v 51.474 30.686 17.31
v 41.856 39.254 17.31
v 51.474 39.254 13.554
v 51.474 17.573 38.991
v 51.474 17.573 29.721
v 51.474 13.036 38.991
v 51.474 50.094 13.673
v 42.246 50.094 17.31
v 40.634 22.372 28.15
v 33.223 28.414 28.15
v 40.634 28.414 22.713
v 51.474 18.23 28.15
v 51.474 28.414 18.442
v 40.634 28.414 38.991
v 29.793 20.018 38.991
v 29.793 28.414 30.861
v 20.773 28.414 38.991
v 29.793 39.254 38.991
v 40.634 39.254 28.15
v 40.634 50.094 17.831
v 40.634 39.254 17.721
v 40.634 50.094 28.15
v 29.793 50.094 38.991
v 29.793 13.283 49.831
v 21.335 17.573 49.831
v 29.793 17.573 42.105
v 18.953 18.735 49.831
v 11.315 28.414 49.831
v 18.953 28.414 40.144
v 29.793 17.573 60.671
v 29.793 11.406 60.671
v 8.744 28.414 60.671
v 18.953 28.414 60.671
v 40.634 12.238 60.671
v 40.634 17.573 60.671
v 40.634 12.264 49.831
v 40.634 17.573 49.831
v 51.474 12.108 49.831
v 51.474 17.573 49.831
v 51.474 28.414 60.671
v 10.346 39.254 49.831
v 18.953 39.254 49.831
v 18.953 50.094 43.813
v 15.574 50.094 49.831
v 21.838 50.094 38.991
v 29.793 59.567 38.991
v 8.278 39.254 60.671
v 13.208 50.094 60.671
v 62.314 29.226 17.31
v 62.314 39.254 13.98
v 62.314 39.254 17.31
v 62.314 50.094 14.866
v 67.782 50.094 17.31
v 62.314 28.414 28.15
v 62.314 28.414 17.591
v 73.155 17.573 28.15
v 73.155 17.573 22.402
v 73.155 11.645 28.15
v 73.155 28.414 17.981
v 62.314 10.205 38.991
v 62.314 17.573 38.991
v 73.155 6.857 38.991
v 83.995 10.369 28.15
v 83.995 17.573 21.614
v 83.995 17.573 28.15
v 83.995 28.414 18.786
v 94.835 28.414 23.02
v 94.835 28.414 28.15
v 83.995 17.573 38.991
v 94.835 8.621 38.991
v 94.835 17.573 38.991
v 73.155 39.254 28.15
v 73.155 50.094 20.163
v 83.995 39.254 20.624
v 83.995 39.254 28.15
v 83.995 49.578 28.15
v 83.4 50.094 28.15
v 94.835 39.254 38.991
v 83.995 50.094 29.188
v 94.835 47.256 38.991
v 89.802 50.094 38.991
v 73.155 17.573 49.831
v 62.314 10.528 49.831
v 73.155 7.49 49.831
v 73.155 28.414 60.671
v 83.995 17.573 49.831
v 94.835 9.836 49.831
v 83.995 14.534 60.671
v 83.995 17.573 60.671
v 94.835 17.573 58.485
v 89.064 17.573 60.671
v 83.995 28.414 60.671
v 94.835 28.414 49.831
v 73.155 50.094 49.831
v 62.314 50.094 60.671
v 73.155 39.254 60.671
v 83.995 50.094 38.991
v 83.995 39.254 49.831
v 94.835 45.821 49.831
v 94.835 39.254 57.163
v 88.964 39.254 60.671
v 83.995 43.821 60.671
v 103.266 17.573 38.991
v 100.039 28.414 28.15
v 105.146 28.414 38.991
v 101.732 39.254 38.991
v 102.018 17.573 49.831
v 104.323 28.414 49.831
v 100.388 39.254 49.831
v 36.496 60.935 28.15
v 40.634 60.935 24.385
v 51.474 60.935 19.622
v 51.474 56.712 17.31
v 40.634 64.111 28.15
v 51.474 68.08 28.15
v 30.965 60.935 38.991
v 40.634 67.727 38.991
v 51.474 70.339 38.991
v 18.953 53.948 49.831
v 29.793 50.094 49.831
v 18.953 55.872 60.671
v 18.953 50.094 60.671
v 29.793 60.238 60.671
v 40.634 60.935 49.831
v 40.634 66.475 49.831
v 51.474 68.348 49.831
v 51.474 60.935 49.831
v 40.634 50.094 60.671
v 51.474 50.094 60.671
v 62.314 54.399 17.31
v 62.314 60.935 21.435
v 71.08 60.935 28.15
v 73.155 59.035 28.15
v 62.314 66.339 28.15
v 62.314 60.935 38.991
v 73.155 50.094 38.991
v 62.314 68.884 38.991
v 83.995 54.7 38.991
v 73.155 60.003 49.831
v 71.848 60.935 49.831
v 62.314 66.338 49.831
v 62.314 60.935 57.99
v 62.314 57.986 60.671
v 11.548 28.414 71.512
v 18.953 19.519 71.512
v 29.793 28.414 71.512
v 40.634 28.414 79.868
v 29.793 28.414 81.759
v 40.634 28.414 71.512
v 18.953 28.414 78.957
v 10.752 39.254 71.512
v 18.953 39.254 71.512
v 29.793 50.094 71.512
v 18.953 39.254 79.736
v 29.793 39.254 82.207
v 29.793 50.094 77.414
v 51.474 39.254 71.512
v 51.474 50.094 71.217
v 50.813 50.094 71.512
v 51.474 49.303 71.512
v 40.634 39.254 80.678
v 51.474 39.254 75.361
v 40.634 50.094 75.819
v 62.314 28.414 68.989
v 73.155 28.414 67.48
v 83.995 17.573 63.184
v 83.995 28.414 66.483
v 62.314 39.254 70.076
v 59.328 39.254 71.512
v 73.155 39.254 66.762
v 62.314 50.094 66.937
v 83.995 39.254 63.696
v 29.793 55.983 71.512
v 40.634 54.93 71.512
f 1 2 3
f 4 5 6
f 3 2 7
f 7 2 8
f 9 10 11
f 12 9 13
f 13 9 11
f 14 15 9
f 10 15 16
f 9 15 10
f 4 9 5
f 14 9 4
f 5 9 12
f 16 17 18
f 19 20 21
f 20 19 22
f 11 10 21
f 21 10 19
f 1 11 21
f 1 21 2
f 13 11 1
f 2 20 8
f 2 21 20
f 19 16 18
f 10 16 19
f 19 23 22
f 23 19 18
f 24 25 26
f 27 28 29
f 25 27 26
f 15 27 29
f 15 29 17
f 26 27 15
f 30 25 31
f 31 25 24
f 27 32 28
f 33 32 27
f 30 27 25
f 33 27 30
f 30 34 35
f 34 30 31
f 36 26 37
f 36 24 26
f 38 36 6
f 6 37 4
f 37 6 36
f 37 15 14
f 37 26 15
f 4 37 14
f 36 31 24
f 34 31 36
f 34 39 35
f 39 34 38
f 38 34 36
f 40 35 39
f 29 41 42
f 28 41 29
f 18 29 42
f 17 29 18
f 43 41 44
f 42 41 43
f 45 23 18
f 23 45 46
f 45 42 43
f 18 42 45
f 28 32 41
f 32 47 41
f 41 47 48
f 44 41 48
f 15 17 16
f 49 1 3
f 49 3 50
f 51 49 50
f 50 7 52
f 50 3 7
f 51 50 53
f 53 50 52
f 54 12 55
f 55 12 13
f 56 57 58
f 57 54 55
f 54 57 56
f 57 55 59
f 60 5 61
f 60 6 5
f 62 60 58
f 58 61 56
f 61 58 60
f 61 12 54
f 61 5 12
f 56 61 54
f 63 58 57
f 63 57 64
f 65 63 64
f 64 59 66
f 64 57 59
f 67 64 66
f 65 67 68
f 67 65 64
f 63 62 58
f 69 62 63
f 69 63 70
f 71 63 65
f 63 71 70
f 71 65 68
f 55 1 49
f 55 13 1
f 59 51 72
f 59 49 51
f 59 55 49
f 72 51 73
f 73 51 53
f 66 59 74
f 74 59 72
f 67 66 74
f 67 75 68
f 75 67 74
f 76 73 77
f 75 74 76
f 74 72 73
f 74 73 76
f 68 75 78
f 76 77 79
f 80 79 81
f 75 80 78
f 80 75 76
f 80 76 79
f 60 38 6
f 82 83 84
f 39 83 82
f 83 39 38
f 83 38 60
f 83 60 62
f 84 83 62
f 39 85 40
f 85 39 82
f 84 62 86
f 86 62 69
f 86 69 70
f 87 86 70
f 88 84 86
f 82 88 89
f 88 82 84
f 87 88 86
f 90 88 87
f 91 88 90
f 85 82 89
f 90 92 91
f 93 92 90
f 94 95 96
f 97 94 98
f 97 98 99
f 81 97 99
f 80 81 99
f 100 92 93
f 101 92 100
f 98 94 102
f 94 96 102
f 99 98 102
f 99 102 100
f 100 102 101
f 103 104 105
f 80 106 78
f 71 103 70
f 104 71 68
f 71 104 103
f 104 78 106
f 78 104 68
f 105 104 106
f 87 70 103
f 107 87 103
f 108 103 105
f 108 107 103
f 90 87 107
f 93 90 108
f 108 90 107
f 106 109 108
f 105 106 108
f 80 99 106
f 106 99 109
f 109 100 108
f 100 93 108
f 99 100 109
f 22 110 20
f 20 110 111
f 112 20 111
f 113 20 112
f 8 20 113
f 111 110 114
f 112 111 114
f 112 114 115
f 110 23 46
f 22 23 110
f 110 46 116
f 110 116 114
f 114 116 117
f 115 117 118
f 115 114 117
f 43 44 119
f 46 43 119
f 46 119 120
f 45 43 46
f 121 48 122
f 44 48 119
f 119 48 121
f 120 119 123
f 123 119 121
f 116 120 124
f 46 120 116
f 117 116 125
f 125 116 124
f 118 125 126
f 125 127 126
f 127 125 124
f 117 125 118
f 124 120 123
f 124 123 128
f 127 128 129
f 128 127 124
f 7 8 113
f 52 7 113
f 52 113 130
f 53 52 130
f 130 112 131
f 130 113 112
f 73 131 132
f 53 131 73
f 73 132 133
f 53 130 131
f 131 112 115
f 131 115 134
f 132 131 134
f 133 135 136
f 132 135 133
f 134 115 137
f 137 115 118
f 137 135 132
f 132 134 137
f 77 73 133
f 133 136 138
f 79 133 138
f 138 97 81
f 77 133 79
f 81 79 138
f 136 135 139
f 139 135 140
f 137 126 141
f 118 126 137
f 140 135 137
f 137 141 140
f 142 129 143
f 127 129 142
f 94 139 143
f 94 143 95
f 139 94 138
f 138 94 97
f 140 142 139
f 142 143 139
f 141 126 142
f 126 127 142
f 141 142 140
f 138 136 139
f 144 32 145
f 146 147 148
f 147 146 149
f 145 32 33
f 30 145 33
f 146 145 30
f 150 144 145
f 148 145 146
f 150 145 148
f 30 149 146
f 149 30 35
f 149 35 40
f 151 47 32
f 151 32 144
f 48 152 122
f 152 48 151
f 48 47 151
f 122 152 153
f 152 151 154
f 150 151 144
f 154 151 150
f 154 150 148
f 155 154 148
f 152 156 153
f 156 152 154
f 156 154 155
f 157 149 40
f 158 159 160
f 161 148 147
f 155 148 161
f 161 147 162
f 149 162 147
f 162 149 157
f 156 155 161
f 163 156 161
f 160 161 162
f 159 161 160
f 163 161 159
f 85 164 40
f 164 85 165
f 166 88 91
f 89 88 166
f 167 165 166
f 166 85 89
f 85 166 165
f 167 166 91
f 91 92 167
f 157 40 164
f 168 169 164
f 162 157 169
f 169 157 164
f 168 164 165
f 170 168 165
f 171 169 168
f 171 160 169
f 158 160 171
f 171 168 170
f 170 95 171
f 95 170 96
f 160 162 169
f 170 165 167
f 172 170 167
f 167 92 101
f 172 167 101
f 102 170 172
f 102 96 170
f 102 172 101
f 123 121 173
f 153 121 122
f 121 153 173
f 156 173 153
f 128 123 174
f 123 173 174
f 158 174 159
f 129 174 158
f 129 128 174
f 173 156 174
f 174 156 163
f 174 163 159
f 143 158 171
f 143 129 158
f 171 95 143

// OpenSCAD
/*
SomeBalls.scad
Public Domain Code
Based on Metaballs By: William A Adams 	4 June 2011

This code is a simplified implementation of the 'metaball' and uses "Marching Cubes" to register the isosurface which is the interaction of the various balls. All Cubes are tested and a joint hull is generated of each corner that lies inside the threshold  of the metaball 



*/
Resolution = 15;//[5:5:50]
MinSubdivisions=4;//[2:1:10] 
// Smaller number larger blob
Threshold = 1.90;// [1.5:0.01:2.5]
Diagnostic=false;
Oversize=0.2;
// List Format [[x,y,z,r],[x,y,z,r]]
//MyBallList=[[50, 50, 50, -11],[25, 5, 5, 35],[95, 5, 75, 45],[-35, 5, 75, 55]];//Threshold = 1.95
MyBallList=[ for(i=[0:2])Lotto(i)];

difference(){
//DrawMetaballs(MyBallList,Threshold);
    DrawMetaballs(MyBallList,2);
//color(rndc())for(i=[0:8]){translate([rands(0, 125, 1)[0],rands(15, 30, 1)[0],rands(15, 35, 1)[0]])rotate([0,90,0])sphere(20,$fn=12);}
    }

module DrawMetaballs(BallList,Threshold) {
 ColorList = [ for(i=[0:len(BallList)])rndc() ];
 
// boundary plus some extra
size=max(findMax(BallList, 0),findMax(BallList, 1),findMax(BallList,2));
DrawSubMetaballs(BallList,ColorList,Threshold,findMin(BallList, 0)-(size*Oversize),findMin(BallList, 1)-(size*Oversize),findMin(BallList, 2)-(size*Oversize),size*(Oversize*2+1)); 
    


 }
module DrawSubMetaballs(BallList,ColorList,Threshold,x,y,z,Size,i=0) {    
  //  echo(i,Size);

suma = BallField3D(x, y, z, BallList, len(BallList) - 1);
sumb = BallField3D(x + Size, y, z, BallList, len(BallList) - 1);
sumc = BallField3D(x, y + Size, z, BallList, len(BallList) - 1);
sumd = BallField3D(x + Size, y + Size, z, BallList, len(BallList) - 1);
sume = BallField3D(x, y, z + Size, BallList, len(BallList) - 1);
sumf = BallField3D(x + Size, y, z + Size, BallList, len(BallList) - 1);
sumg = BallField3D(x, y + Size, z + Size, BallList, len(BallList) - 1);
sumh = BallField3D(x + Size, y + Size, z + Size, BallList, len(BallList) - 1);
sumcolor =lim31(1, ColorField3D(x, y, z, BallList,ColorList, len(BallList) - 1));


    
sab=inter(suma,sumb)*Size;
sac=inter(suma,sumc)*Size;
sae=inter(suma,sume)*Size;
sba=inter(sumb,suma)*Size;
sbd=inter(sumb,sumd)*Size;
sbf=inter(sumb,sumf)*Size;
sca=inter(sumc,suma)*Size;
scd=inter(sumc,sumd)*Size;
scg=inter(sumc,sumg)*Size;
sdb=inter(sumd,sumb)*Size;
sdc=inter(sumd,sumc)*Size;
sdh=inter(sumd,sumh)*Size;
sea=inter(sume,suma)*Size;
seg=inter(sume,sumg)*Size;
sef=inter(sume,sumf)*Size;
sfh=inter(sumf,sumh)*Size;
sfe=inter(sumf,sume)*Size;
sfb=inter(sumf,sumb)*Size;
sge=inter(sumg,sume)*Size;
sgh=inter(sumg,sumh)*Size;
sgc=inter(sumg,sumc)*Size;
shg=inter(sumh,sumg)*Size;
shf=inter(sumh,sumf)*Size;
shd=inter(sumh,sumd)*Size;

// test for empty and full Cubes
 if (Size>pow(Resolution, MinSubdivisions)||i<MinSubdivisions) { 
    h=Size*0.5  ;
    DrawSubMetaballs(BallList,ColorList,Threshold,x,y,z,h,i+1);
    DrawSubMetaballs(BallList,ColorList,Threshold,x+h,y,z,h,i+1);
    DrawSubMetaballs(BallList,ColorList,Threshold,x,y+h,z,h,i+1);
    DrawSubMetaballs(BallList,ColorList,Threshold,x+h,y+h,z,h,i+1);
    
    DrawSubMetaballs(BallList,ColorList,Threshold,x,y,z+h,h,i+1);
    DrawSubMetaballs(BallList,ColorList,Threshold,x+h,y,z+h,h,i+1);
    DrawSubMetaballs(BallList,ColorList,Threshold,x,y+h,z+h,h,i+1);
    DrawSubMetaballs(BallList,ColorList,Threshold,x+h,y+h,z+h,h,i+1);
    
    }else {
    
if (  suma <= Threshold && sumb <= Threshold && sumc <= Threshold && sumd <= Threshold && sume <= Threshold && sumf <= Threshold && sumg <= Threshold && sumh <= Threshold) {if (Diagnostic){translate([x, y, z]) %cube(Size);}} 
else if ( suma > Threshold && sumb > Threshold && sumc > Threshold && sumd > Threshold && sume > Threshold && sumf > Threshold && sumg > Threshold && sumh > Threshold) {
translate([x, y, z])  color(sumcolor) cube(Size);} 


else if(Size>Resolution){ 
    h=Size*0.5  ;
    DrawSubMetaballs(BallList,ColorList,Threshold,x,y,z,h,i+1);
    DrawSubMetaballs(BallList,ColorList,Threshold,x+h,y,z,h,i+1);
    DrawSubMetaballs(BallList,ColorList,Threshold,x,y+h,z,h,i+1);
    DrawSubMetaballs(BallList,ColorList,Threshold,x+h,y+h,z,h,i+1);
    
    DrawSubMetaballs(BallList,ColorList,Threshold,x,y,z+h,h,i+1);
    DrawSubMetaballs(BallList,ColorList,Threshold,x+h,y,z+h,h,i+1);
    DrawSubMetaballs(BallList,ColorList,Threshold,x,y+h,z+h,h,i+1);
    DrawSubMetaballs(BallList,ColorList,Threshold,x+h,y+h,z+h,h,i+1);}
else { 

    // For every corner inside treshold make and mirror a corner piece, hull the lot.
   //echo(sumcolor);
    color(sumcolor)hull(){
if (suma > Threshold){    translate([x, y, z])  Corner(sab,sac,sae);}
if (sumb > Threshold){    translate([x + Size, y, z])  Corner(-sba,sbd,sbf);}
if (sumc > Threshold){  translate([x, y + Size, z])  Corner(scd,-sca,scg);}
if (sumd > Threshold){    translate([x + Size, y + Size, z]) Corner(-sdc,-sdb,sdh);}
    
if (sume > Threshold){   translate([x, y, z + Size])  Corner(sef,seg,-sea);}
if (sumf > Threshold){   translate([x + Size, y, z + Size])  Corner(-sfe,sfh,-sfb);}
if (sumg > Threshold){    translate([x, y + Size, z + Size])  Corner(sgh,-sge,-sgc);}
if (sumh > Threshold){    translate([x + Size, y + Size, z + Size]) Corner(-shg,-shf,-shd);}
}
    }
}}




//Corner piece
module Corner(u=0.5,v=0.5,w=0.5) {scale([u,v,w])
polyhedron
    (points = [	       [0,0,0],[1,0,0],[0,1,0],[0,0,1],],      faces = [		  [0,0,1],[0,0,2],[0,0,3],[1,2,3]
		  ]
     );}
     
     function lim31(l, v) = v / len3(v) * l;
     function len3(v) = sqrt(pow(v[0], 2) + pow(v[1], 2) + pow(v[2], 2));
// Random color

function Lotto(i) = [rands(i*30,i*30+ 30, 1)[0],rands(0, 65, 1)[0],rands(0, 75, 1)[0],rands(21, 24, 1)[0]];

//Field function
     function ColorField3D(x, y, z, BallSack,Colorsack, i) = (i == 0) ? Powercolor(x, y, z, BallSack[0])*Colorsack[0]: Powercolor(x, y, z, BallSack[i])*Colorsack[i] + ColorField3D(x, y, z, BallSack,Colorsack, i - 1);

function Powercolor(x, y, z, Ball) = (Ball[3] / sqrt((x - Ball[0]) * (x - Ball[0]) + (y - Ball[1]) * (y - Ball[1]) + (z - Ball[2]) * (z - Ball[2])));     
function Powerball(x, y, z, Ball) = (Ball[3] / sqrt((x - Ball[0]) * (x - Ball[0]) + (y - Ball[1]) * (y - Ball[1]) + (z - Ball[2]) * (z - Ball[2])));
// Recursive Field Evaluation
function BallField3D(x, y, z, BallSack, i) = (i == 0) ? Powerball(x, y, z, BallSack[0]): Powerball(x, y, z, BallSack[i]) + BallField3D(x, y, z, BallSack, i - 1);
function rndc() = [round(rands(0, 2, 1)[0])/2, round(rands(0, 2, 1)[0])/2, round(rands(0, 2, 1)[0])/2];
     //interpolate
function inter(t,r)=(t==r)?1:(t>Threshold)?(r<Threshold)? abs(Threshold-t)/abs(t-r) :0 :(r>Threshold)? abs(Threshold-t)/abs(t-r) :1 ;
// Recursive find min/max extremes
function findMax(v, select, i = 0) = ((i + 1) < len(v)) ? max(v[i][select] + abs(v[i][3]) + Resolution, findMax(v, select, i + 1)): v[i][select] + abs(v[i][3]) + Resolution;
function findMin(v, select, i = 0) = ((i + 1) < len(v)) ? min(v[i][select] - abs(v[i][3]) - Resolution, findMin(v, select, i + 1)): v[i][select] - abs(v[i][3]) - Resolution;
